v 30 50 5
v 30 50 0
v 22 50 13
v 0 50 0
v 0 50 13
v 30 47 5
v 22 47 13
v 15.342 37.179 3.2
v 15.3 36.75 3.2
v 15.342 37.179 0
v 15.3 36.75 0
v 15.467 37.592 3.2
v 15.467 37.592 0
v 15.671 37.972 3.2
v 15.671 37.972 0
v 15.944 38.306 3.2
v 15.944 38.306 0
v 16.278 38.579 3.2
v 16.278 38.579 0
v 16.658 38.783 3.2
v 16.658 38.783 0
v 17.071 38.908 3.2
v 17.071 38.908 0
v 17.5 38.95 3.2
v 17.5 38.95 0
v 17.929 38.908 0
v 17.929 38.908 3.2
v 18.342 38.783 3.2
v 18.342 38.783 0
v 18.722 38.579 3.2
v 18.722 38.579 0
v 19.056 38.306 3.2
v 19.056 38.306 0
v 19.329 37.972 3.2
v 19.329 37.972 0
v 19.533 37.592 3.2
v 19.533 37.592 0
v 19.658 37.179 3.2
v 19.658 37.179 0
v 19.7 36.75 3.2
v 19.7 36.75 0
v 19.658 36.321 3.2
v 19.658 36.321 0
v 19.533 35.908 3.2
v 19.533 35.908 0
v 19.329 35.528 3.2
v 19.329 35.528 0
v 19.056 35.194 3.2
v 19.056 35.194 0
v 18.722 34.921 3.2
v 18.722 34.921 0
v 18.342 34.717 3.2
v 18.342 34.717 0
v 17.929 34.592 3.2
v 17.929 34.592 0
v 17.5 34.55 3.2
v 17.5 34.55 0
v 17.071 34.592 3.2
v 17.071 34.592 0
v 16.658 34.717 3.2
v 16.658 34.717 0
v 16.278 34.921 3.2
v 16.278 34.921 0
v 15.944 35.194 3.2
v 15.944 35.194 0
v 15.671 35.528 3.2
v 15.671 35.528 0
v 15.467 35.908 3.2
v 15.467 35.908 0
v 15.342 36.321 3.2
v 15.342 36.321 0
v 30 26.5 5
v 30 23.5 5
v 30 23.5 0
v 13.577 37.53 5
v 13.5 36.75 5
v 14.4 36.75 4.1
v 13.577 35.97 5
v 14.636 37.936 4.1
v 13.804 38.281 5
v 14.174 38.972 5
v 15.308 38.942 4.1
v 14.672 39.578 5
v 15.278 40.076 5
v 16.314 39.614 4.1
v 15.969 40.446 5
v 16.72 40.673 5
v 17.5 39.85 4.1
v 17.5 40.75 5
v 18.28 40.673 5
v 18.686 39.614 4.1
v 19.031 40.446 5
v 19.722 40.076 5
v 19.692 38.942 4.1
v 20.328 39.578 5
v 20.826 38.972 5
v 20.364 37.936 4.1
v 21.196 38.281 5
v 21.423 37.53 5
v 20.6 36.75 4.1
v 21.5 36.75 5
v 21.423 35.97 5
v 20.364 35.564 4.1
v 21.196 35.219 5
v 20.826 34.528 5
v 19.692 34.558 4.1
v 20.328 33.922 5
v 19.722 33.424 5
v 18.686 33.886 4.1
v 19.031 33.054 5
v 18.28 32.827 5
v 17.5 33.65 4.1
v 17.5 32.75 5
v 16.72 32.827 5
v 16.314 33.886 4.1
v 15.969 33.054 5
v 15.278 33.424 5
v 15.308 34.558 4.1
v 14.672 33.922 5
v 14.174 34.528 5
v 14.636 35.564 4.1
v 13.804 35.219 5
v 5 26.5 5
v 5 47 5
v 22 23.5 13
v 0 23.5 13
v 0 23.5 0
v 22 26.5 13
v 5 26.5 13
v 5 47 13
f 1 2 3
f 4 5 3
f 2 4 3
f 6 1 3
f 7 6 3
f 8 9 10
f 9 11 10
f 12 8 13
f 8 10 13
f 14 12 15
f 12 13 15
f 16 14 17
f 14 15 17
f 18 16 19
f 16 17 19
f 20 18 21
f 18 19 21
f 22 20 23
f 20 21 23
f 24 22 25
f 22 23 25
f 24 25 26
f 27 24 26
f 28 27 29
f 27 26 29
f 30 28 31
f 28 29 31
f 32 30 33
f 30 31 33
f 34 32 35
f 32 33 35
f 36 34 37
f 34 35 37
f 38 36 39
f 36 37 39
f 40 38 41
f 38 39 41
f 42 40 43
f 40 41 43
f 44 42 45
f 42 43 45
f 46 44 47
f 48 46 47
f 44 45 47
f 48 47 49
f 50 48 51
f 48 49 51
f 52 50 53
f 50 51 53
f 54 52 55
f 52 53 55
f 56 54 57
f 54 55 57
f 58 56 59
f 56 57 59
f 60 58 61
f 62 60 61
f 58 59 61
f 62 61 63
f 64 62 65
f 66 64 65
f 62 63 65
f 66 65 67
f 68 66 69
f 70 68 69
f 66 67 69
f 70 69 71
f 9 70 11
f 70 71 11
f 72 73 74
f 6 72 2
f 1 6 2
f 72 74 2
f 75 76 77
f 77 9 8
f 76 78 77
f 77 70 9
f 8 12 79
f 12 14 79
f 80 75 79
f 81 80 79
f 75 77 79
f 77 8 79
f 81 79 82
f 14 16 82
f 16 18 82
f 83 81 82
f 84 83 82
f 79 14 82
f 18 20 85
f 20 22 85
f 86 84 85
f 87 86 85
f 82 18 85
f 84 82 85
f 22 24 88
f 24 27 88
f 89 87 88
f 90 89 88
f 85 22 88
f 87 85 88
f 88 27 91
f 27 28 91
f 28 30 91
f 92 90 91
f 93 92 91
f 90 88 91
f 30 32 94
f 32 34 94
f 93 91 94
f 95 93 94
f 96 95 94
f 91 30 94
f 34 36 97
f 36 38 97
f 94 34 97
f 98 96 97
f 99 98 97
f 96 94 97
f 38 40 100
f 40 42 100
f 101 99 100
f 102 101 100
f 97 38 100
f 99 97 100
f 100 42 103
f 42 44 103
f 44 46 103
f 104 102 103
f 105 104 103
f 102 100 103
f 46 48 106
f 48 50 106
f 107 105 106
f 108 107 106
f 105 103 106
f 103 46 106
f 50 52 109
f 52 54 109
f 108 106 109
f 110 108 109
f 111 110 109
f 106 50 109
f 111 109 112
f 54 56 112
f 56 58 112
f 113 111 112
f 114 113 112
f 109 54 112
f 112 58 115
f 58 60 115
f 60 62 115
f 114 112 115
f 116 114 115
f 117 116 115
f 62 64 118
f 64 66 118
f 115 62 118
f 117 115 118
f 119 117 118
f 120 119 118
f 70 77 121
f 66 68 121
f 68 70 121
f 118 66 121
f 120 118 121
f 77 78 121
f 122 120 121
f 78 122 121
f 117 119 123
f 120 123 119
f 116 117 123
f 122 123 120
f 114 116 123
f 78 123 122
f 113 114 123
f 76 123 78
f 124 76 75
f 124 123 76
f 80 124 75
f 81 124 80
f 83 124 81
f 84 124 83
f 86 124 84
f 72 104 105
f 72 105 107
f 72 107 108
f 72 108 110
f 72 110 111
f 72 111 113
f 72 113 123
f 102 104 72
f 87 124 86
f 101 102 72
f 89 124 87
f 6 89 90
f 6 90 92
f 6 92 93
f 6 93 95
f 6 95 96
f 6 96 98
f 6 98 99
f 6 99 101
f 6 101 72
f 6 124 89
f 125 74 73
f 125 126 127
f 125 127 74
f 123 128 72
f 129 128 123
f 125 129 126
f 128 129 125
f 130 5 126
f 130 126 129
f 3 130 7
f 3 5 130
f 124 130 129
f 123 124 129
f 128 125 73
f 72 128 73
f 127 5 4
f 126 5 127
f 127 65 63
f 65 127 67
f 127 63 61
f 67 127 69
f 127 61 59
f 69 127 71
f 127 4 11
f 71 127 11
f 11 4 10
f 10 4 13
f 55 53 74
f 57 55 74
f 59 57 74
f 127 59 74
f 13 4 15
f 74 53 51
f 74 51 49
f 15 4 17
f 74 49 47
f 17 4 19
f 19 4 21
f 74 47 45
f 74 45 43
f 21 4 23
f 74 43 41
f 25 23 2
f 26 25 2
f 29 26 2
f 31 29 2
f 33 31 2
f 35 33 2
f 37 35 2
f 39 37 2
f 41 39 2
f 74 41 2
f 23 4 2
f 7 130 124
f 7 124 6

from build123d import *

# Parameters (mm, degrees)
SKETCH015_W         = 30
SKETCH015_H         = 50
PAD014_DEPTH        = 5
SKETCH016_W         = 50
SKETCH016_H         = 25
PAD013_DEPTH        = 5
PAD010_DEPTH        = 3
PAD011_DEPTH        = 1.5
PAD012_DEPTH        = 3
HOLE002_D           = 4.4
HOLE002_DEPTH       = 25
HOLE002_CSINK_D     = 8
HOLE002_CSINK_ANGLE = 90
SKETCH018_W         = 40.900608
SKETCH018_H         = 56.513194
POCKET001_DEPTH     = 25
SKETCH020_W         = 45.434352
SKETCH020_H         = 34.44481
POCKET002_DEPTH     = 23.5


with BuildPart() as part:
    # Sketch015 → Pad014 (new body)
    with BuildSketch(Plane.XY):
        with Locations((15, 25)):
            Rectangle(SKETCH015_W, SKETCH015_H)
    extrude(amount=PAD014_DEPTH)

    # Sketch016 → Pad013 (join)
    with BuildSketch(Plane(origin=(0, 0, 0), x_dir=(0, -1, 0), z_dir=(-1, 0, 0))):
        with Locations((-25, 17.5)):
            Rectangle(SKETCH016_W, SKETCH016_H)
    extrude(amount=-PAD013_DEPTH)

    # Sketch014 → Pad010 (join)
    with BuildSketch(Plane.XZ):
        Polygon((5, 5), (5, 30), (30, 5), align=None)
    extrude(amount=-PAD010_DEPTH)

    # Sketch017 → Pad011 (join, symmetric)
    with BuildSketch(Plane.XZ.offset(-25)):
        Polygon((5, 5), (5, 30), (30, 5), align=None)
    extrude(amount=PAD011_DEPTH, both=True)

    # Sketch013 → Pad012 (join)
    with BuildSketch(Plane.XZ.offset(-50)):
        Polygon((5, 30), (5, 5), (30, 5), align=None)
    extrude(amount=PAD012_DEPTH)

    # Hole002
    with Locations(Plane.XY.offset(5)):
        with Locations((17.5, 36.75), (17.5, 13.25)):
            CounterSinkHole(HOLE002_D / 2, HOLE002_CSINK_D / 2, depth=HOLE002_DEPTH, counter_sink_angle=HOLE002_CSINK_ANGLE)

    # Sketch018 → Pocket001 (cut)
    with BuildSketch(Plane.XY.offset(13)):
        with Locations((14.816534, 25.266581)):
            Rectangle(SKETCH018_W, SKETCH018_H)
    extrude(amount=POCKET001_DEPTH, mode=Mode.SUBTRACT)

    # Sketch020 → Pocket002 (cut)
    with BuildSketch(Plane.XZ):
        with Locations((13.859938, 7.463043)):
            Rectangle(SKETCH020_W, SKETCH020_H)
    extrude(amount=-POCKET002_DEPTH, mode=Mode.SUBTRACT)


solid = part.part
